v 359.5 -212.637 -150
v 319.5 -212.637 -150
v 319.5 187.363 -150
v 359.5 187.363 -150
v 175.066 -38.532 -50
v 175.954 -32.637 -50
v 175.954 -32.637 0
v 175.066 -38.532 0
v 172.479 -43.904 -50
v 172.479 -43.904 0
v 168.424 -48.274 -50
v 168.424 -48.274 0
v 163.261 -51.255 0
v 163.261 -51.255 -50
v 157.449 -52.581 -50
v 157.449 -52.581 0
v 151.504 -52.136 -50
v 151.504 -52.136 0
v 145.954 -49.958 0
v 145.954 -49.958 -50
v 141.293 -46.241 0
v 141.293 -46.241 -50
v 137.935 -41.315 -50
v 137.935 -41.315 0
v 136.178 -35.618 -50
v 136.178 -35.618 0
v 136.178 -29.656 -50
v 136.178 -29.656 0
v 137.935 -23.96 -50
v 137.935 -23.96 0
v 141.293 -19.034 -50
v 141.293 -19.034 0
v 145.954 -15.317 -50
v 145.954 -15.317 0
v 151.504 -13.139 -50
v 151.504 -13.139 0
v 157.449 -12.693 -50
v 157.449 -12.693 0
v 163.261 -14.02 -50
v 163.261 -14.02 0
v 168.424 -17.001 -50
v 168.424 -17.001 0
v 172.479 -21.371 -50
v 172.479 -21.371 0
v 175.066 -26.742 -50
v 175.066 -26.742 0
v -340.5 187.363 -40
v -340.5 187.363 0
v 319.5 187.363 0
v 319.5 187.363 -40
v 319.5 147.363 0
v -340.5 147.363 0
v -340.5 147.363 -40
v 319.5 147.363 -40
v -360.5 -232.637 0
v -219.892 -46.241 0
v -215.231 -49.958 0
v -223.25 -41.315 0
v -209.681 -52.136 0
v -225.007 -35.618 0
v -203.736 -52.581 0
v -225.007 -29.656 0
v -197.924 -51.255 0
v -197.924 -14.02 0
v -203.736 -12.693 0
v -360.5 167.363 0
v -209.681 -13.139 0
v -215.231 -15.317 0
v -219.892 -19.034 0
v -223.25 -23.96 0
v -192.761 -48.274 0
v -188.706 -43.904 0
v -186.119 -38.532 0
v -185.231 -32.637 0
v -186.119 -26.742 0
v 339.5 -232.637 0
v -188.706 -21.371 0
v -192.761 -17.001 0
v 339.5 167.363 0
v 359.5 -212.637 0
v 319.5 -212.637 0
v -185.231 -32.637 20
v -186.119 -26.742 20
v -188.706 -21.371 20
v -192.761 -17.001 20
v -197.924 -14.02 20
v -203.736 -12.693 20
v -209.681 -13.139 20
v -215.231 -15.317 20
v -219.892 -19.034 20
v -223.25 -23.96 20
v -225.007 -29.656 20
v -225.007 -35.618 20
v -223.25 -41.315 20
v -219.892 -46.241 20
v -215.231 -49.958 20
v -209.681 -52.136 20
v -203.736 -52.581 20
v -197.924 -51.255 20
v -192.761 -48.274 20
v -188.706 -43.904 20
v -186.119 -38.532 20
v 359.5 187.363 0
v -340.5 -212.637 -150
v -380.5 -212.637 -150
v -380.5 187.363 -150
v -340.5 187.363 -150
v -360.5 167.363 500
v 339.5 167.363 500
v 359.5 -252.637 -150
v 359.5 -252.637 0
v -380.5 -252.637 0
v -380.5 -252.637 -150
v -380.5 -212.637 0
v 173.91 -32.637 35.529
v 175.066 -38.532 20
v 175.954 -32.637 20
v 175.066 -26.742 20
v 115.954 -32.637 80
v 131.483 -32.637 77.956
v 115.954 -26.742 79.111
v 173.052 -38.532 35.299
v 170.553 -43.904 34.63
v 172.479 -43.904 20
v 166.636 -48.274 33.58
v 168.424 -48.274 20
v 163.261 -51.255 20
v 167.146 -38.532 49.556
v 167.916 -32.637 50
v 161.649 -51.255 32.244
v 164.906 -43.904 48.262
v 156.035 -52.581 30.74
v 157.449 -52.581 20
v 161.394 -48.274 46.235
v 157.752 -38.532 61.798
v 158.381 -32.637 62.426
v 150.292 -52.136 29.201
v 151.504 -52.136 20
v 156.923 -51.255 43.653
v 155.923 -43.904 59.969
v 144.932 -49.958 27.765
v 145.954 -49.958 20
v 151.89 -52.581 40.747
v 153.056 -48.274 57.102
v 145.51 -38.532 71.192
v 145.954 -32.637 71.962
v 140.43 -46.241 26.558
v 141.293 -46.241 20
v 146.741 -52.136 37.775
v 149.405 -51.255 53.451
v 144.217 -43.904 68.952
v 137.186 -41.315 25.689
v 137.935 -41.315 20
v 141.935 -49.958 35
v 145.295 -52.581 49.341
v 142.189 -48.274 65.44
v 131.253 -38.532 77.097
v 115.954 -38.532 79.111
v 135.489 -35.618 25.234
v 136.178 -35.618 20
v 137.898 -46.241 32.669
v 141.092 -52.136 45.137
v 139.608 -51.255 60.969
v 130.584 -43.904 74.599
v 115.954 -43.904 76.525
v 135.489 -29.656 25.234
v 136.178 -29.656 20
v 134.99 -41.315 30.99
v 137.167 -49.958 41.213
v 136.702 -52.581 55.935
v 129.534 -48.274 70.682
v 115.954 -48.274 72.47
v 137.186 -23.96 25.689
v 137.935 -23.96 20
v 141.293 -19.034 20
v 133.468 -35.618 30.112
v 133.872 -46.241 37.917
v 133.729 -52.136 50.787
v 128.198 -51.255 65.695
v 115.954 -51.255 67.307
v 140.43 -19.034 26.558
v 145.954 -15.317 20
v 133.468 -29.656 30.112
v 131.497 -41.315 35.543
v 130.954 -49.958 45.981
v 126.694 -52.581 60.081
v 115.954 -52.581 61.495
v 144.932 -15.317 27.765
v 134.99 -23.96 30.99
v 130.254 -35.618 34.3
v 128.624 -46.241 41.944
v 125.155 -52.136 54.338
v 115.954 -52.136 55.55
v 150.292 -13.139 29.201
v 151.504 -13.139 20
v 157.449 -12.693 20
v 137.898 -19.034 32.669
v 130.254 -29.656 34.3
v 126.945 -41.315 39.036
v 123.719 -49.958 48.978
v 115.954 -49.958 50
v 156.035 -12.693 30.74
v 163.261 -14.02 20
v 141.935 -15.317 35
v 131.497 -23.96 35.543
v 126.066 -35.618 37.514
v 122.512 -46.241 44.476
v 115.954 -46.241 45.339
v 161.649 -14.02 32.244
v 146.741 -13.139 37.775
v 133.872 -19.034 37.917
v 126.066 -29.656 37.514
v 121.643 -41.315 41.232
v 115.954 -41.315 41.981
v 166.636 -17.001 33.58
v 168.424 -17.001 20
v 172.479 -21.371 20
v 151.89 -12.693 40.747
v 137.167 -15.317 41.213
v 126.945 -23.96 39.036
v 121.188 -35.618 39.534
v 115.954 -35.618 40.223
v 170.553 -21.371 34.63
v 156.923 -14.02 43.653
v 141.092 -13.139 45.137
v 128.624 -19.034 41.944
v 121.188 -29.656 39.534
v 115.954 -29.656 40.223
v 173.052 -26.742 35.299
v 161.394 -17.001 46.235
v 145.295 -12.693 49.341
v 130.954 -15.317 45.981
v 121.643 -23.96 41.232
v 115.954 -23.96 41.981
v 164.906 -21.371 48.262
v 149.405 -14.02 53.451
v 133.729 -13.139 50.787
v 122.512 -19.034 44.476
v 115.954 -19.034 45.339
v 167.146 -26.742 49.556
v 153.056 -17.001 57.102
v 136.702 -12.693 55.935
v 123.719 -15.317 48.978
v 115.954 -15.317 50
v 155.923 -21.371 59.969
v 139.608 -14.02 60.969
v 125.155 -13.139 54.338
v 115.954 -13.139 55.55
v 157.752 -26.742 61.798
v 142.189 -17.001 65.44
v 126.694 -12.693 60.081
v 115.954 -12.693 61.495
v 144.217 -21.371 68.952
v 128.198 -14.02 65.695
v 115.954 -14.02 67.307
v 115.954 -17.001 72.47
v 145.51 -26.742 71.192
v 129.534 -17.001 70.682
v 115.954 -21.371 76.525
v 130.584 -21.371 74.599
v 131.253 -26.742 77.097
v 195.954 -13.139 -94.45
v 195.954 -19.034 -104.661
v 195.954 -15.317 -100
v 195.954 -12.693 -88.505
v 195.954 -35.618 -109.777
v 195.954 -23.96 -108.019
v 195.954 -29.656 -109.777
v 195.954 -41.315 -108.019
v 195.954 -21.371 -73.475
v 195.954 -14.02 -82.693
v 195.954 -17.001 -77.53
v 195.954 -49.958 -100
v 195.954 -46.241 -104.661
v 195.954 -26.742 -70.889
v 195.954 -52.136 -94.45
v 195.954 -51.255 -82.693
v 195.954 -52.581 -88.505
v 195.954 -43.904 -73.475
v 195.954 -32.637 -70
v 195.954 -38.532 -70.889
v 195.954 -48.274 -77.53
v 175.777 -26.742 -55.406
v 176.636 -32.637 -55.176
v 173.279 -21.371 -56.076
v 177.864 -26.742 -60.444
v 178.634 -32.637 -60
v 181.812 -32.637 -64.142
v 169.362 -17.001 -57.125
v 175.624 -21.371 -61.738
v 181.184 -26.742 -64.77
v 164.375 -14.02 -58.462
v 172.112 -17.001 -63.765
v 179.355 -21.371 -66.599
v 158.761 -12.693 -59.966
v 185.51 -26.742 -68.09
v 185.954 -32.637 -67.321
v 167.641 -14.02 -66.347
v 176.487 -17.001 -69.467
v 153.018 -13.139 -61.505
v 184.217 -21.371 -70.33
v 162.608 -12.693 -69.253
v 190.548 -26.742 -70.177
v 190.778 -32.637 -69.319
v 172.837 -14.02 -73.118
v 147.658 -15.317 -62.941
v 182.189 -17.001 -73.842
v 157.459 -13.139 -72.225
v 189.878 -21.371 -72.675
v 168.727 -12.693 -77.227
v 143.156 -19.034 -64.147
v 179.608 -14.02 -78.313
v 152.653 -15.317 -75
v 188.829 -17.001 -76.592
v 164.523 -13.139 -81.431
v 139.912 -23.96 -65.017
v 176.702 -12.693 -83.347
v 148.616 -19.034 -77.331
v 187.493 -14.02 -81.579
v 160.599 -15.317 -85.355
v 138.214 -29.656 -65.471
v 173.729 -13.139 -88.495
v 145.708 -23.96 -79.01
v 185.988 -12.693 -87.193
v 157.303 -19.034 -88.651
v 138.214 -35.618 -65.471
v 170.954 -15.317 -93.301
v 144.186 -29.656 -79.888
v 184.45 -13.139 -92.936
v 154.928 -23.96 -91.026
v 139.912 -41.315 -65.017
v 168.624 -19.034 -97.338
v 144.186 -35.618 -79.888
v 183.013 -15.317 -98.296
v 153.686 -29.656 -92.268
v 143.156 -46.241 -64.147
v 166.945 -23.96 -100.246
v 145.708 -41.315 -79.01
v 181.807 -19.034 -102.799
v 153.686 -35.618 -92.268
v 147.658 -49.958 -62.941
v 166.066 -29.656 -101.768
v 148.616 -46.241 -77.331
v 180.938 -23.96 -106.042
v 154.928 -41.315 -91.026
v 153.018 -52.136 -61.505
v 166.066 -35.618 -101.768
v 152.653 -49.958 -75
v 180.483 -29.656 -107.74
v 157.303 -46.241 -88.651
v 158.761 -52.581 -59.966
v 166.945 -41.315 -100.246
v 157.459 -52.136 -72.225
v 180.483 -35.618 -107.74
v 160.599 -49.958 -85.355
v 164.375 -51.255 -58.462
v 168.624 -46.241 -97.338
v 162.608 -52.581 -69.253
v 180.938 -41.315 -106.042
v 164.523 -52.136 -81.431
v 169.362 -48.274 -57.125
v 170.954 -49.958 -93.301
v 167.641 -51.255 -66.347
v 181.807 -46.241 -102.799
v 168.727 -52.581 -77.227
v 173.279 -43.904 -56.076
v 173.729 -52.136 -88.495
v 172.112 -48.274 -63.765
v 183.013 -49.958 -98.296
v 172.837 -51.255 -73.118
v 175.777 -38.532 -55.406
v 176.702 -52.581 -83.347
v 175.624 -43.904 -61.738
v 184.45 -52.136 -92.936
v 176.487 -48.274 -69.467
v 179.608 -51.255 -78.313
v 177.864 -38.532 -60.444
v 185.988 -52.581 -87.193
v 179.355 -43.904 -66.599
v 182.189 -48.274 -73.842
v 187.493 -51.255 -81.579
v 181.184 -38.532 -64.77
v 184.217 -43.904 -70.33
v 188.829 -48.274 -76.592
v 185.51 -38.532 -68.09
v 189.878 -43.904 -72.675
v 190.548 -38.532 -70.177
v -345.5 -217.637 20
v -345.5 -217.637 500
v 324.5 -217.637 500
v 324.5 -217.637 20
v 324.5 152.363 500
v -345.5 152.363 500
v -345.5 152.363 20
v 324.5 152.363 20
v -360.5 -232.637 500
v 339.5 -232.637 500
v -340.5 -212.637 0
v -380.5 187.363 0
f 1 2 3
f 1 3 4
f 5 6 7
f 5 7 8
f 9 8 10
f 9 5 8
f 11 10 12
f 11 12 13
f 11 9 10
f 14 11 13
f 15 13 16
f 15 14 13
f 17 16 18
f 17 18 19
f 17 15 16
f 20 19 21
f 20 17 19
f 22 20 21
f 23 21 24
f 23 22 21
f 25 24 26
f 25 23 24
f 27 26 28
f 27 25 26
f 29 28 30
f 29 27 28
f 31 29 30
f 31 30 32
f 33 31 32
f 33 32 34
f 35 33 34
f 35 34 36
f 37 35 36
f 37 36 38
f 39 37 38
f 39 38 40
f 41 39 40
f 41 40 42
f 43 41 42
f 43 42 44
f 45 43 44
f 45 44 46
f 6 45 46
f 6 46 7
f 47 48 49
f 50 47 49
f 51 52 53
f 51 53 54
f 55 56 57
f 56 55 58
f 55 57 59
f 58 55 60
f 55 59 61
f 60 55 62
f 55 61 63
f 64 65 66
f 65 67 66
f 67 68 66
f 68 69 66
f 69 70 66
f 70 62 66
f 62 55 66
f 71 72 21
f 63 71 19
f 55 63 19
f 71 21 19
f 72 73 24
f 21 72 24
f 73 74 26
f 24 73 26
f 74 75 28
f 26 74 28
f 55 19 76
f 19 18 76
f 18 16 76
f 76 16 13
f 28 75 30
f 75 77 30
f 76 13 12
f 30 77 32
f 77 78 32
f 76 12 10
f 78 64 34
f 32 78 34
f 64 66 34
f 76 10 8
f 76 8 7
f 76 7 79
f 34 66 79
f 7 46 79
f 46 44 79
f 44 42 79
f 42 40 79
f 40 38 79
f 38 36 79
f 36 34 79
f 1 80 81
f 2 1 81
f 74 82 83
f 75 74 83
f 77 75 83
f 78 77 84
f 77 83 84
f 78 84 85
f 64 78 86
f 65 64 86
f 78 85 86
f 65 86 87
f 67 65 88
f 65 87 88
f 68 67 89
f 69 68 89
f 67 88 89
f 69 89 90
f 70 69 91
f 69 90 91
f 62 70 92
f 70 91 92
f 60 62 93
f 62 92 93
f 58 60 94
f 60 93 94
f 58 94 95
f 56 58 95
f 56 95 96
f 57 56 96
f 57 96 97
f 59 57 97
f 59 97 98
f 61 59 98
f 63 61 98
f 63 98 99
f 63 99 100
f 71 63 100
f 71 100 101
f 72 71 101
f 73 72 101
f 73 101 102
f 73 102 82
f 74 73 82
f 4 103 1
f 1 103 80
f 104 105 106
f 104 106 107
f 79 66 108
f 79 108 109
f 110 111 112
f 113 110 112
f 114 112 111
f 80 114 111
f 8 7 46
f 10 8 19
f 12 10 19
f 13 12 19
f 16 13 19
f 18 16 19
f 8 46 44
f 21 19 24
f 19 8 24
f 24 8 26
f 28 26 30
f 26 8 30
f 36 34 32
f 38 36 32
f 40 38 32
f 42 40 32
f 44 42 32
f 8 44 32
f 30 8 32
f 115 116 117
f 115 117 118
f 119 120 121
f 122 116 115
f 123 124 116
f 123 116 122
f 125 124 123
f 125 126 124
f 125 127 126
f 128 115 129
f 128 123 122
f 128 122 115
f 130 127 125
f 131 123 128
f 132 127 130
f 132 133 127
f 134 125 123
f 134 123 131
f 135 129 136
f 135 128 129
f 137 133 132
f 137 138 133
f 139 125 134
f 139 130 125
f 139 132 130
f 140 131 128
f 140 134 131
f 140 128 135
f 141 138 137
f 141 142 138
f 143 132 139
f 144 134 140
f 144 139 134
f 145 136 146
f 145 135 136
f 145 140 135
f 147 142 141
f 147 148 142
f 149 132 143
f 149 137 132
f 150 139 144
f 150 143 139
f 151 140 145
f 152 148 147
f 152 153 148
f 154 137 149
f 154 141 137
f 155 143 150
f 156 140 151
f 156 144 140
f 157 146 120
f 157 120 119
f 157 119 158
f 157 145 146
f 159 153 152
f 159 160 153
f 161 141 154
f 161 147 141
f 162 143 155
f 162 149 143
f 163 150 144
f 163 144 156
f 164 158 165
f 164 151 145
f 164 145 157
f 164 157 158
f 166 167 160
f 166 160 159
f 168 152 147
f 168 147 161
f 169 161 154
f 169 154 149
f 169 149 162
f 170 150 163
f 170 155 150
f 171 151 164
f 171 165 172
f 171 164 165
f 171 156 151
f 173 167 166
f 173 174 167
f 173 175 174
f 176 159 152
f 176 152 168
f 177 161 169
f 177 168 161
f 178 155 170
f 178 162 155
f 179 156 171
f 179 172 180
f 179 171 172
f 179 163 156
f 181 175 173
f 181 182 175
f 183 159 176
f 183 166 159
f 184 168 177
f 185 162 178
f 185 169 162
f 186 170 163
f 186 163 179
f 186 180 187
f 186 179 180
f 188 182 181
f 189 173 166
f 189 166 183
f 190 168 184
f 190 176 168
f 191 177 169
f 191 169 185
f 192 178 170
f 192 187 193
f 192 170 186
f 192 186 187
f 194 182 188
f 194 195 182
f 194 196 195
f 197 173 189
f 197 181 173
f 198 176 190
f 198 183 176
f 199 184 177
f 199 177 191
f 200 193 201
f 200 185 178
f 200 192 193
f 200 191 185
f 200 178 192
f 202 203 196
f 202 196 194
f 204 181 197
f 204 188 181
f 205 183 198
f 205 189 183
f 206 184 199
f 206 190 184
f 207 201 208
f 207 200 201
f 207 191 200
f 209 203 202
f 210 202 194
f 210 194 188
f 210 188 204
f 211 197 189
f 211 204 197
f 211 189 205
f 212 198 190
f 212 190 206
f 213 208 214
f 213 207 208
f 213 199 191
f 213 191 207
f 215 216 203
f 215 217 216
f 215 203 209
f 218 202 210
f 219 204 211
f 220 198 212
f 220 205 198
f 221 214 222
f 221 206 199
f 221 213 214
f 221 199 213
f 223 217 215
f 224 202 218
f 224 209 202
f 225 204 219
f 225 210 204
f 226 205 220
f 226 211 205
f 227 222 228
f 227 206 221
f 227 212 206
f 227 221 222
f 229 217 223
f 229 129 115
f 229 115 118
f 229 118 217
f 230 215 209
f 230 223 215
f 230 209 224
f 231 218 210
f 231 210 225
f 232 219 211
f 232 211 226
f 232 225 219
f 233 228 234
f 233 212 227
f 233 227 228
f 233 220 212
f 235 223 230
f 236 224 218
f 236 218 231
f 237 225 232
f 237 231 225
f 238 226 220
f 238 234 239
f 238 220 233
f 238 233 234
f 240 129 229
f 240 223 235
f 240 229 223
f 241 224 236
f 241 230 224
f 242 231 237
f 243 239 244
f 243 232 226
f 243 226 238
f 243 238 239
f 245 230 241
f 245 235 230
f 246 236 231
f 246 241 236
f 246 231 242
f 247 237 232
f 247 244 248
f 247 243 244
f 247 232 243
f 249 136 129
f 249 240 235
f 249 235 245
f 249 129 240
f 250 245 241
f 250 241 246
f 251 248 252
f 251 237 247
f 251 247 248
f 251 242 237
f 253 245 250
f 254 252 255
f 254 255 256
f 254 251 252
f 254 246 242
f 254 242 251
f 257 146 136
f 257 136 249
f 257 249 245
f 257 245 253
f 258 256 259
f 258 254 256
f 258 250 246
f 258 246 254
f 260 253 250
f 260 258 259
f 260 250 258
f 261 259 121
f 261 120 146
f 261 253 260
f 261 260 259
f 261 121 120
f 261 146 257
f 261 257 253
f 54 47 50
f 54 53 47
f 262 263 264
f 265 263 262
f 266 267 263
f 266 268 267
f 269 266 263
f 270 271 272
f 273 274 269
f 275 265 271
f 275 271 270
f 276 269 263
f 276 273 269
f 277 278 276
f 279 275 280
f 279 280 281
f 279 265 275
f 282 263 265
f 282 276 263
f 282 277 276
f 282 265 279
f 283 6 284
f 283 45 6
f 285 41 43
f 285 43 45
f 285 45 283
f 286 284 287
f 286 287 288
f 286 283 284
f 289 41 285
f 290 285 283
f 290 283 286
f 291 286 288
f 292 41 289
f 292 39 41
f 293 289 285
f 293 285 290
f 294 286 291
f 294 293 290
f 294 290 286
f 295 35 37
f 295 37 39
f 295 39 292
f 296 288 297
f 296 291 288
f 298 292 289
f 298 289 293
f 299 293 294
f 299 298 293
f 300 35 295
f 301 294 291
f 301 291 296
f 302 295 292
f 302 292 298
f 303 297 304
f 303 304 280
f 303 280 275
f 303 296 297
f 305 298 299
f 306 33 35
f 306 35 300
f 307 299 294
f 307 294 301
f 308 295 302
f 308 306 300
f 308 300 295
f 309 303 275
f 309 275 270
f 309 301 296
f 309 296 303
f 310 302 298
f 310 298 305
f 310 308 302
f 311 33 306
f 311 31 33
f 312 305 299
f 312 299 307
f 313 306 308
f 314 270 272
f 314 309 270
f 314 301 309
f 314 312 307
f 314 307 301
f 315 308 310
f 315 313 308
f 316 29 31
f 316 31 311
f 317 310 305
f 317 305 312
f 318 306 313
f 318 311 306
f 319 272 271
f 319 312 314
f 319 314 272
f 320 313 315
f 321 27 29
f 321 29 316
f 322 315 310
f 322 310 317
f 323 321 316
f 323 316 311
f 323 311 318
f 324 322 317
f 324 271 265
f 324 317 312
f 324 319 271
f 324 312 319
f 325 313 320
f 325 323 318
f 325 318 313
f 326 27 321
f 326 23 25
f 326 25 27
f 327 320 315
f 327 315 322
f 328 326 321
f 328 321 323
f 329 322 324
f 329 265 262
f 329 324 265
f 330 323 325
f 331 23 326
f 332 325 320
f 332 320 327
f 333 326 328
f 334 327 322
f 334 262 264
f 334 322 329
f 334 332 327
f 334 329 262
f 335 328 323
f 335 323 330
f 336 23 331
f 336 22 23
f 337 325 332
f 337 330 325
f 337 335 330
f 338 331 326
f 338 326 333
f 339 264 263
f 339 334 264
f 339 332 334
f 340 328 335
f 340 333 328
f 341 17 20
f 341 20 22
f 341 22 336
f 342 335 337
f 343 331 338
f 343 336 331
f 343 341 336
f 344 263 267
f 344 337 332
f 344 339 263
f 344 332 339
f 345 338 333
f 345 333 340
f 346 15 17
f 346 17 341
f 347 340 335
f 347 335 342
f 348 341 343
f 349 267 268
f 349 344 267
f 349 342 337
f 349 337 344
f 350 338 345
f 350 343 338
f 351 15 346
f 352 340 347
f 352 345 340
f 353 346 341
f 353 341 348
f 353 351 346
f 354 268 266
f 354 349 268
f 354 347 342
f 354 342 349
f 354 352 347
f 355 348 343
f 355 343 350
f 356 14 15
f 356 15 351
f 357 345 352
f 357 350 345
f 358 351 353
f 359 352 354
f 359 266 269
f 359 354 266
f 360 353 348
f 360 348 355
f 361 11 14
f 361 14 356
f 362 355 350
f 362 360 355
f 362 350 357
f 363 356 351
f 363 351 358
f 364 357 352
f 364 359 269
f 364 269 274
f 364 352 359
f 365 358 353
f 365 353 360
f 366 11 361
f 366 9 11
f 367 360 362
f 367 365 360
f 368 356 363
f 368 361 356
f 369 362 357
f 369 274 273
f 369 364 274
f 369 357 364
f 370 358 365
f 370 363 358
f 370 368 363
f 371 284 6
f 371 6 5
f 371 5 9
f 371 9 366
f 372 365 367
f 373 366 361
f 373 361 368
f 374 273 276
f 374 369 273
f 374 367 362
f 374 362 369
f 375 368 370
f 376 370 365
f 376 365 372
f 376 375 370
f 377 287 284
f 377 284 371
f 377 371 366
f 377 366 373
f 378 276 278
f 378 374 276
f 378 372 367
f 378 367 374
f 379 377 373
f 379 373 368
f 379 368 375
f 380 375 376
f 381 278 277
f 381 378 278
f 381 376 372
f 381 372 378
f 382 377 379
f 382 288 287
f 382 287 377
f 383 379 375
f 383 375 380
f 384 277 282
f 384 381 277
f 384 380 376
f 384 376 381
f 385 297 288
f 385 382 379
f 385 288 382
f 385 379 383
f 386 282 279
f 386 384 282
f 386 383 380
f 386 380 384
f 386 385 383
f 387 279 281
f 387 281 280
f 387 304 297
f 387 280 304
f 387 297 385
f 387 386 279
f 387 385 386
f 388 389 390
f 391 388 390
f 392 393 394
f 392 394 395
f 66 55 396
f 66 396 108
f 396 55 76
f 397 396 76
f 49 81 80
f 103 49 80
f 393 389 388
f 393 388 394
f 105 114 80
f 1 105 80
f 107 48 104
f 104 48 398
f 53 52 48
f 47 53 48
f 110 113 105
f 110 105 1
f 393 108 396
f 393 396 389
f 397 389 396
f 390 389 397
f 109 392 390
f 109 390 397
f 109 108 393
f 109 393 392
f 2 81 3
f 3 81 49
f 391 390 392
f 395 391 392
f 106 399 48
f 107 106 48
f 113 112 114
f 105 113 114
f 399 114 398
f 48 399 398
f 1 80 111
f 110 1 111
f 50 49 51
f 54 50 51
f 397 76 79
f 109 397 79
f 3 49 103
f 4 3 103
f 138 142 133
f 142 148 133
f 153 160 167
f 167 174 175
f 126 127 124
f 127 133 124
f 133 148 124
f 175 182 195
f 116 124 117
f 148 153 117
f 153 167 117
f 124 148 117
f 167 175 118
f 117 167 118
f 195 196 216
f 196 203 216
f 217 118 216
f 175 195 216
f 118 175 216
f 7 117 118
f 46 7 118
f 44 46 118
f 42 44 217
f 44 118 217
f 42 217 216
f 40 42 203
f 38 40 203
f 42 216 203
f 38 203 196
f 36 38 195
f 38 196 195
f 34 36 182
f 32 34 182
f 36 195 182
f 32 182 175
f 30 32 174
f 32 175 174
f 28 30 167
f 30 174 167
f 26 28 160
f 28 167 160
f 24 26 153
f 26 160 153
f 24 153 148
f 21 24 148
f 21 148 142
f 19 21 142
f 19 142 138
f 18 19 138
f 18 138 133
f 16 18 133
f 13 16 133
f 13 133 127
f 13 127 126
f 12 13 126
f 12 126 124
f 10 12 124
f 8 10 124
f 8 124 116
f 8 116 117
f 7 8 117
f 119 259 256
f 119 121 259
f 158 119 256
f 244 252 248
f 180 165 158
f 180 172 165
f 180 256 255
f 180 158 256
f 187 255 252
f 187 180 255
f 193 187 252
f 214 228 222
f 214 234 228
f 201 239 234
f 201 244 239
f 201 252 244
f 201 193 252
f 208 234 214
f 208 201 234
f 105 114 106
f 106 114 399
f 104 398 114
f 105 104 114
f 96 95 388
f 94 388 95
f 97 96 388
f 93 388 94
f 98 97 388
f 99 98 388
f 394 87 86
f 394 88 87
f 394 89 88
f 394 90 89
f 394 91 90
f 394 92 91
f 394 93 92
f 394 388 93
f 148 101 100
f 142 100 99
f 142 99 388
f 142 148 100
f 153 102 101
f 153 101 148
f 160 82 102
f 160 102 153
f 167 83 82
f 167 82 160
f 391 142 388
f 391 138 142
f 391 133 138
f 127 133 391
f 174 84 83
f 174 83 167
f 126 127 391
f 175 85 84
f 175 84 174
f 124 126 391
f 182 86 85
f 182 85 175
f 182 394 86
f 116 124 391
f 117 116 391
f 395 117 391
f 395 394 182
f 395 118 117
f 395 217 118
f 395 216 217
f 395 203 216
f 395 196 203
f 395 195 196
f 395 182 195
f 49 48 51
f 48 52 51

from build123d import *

# Parameters (mm, degrees)
F0_W      = 700
F0_H      = 400
F1_DEPTH  = 500
F2_W      = 670
F2_H      = 370
F3_DEPTH  = 480
F5_DEPTH  = 150
F6_DEPTH  = 150
F7_DEPTH  = 150
F4_W      = 660
F4_H      = 20
F8_DEPTH  = 40
F9_R      = 20
F10_DEPTH = 170.001
F14_R     = 20


with BuildPart() as f1:
    # F0 (on Top) → F1 (new body)
    with BuildSketch(Plane.XY):
        with Locations((-10.4999998584, -32.6372176104)):
            Rectangle(F0_W, F0_H)
    extrude(amount=F1_DEPTH)

    # F2 (on face) → F3 (cut)
    with BuildSketch(Plane.XY.offset(500)):
        with Locations((-10.4999998584, -32.6372176104)):
            Rectangle(F2_W, F2_H)
    extrude(amount=-F3_DEPTH, mode=Mode.SUBTRACT)

    # F9 (on face) → F10 (cut, through all)
    with BuildSketch(Plane.XY.offset(20)):
        with Locations((-205.2306979895, -32.6372176104)):
            Circle(F9_R)
        with Locations((155.9542268515, -32.6372176104)):
            Circle(F9_R)
    extrude(amount=-F10_DEPTH, mode=Mode.SUBTRACT)


with BuildPart() as f5:
    # F4 (on face) → F5 (new body)
    with BuildSketch(Plane(origin=(0, 0, 0), x_dir=(1, 0, 0), z_dir=(0, 0, -1))):
        Polygon((-360.4999998584, 212.6372176104), (-380.4999998584, 212.6372176104), (-380.4999998584, -187.3627823896), (-340.4999998584, -187.3627823896), (-340.4999998584, -167.3627823896), (-360.4999998584, -167.3627823896), align=None)
        Polygon((-340.4999998584, 212.6372176104), (-360.4999998584, 212.6372176104), (-360.4999998584, -167.3627823896), (-340.4999998584, -167.3627823896), (-340.4999998584, -147.3627823896), align=None)
    extrude(amount=F5_DEPTH)


with BuildPart() as f6:
    # F4 (on face) → F6 (new body)
    with BuildSketch(Plane(origin=(0, 0, 0), x_dir=(1, 0, 0), z_dir=(0, 0, -1))):
        Polygon((359.5000001416, 252.6372176104), (-380.4999998584, 252.6372176104), (-380.4999998584, 212.6372176104), (-360.4999998584, 212.6372176104), (-360.4999998584, 232.6372176104), (339.5000001416, 232.6372176104), (339.5000001416, 212.6372176104), (359.5000001416, 212.6372176104), align=None)
        Polygon((-360.4999998584, 232.6372176104), (-360.4999998584, 212.6372176104), (-340.4999998584, 212.6372176104), (319.5000001416, 212.6372176104), (339.5000001416, 212.6372176104), (339.5000001416, 232.6372176104), align=None)
    extrude(amount=F6_DEPTH)


with BuildPart() as f7:
    # F4 (on face) → F7 (new body)
    with BuildSketch(Plane(origin=(0, 0, 0), x_dir=(1, 0, 0), z_dir=(0, 0, -1))):
        Polygon((359.5000001416, -187.3627823896), (359.5000001416, 212.6372176104), (339.5000001416, 212.6372176104), (339.5000001416, -167.3627823896), (319.5000001416, -167.3627823896), (319.5000001416, -187.3627823896), align=None)
        Polygon((339.5000001416, -167.3627823896), (339.5000001416, 212.6372176104), (319.5000001416, 212.6372176104), (319.5000001416, -147.3627823896), (319.5000001416, -167.3627823896), align=None)
    extrude(amount=F7_DEPTH)


with BuildPart() as f8:
    # F4 (on face) → F8 (new body)
    with BuildSketch(Plane(origin=(0, 0, 0), x_dir=(1, 0, 0), z_dir=(0, 0, -1))):
        with Locations((-10.4999998584, -177.3627823896)):
            Rectangle(F4_W, F4_H)
        with Locations((-10.4999998584, -157.3627823896)):
            Rectangle(F4_W, F4_H)
    extrude(amount=F8_DEPTH)


with BuildPart() as f13:
    # F13: sweep along a path in F12
    with BuildLine(Plane.XZ.offset(32.6372176104)) as f13_path:
        ThreePointArc((155.9542268515, 20), (144.2384980989, 48.2842712475), (115.9542268515, 60))
    # F9 (on face) → F13 (sweep)
    with BuildSketch(Plane.XY.offset(20)):
        with Locations((155.9542268515, -32.6372176104)):
            Circle(F9_R)
    sweep(path=f13_path.line)


with BuildPart() as f15:
    # F15: sweep along a path in F12
    with BuildLine(Plane.XZ.offset(32.6372176104)) as f15_path:
        Line((155.9542268515, 0), (155.9542268515, -50))
        ThreePointArc((155.9542268515, -50), (167.669955604, -78.2842712475), (195.9542268515, -90))
    # F14 (on face) → F15 (sweep)
    with BuildSketch(Plane(origin=(0, 0, 0), x_dir=(1, 0, 0), z_dir=(0, 0, -1))):
        with Locations((155.9542268515, 32.6372176104)):
            Circle(F14_R)
    sweep(path=f15_path.line)


solid = Compound([f1.part, f5.part, f6.part, f7.part, f8.part, f13.part, f15.part])
